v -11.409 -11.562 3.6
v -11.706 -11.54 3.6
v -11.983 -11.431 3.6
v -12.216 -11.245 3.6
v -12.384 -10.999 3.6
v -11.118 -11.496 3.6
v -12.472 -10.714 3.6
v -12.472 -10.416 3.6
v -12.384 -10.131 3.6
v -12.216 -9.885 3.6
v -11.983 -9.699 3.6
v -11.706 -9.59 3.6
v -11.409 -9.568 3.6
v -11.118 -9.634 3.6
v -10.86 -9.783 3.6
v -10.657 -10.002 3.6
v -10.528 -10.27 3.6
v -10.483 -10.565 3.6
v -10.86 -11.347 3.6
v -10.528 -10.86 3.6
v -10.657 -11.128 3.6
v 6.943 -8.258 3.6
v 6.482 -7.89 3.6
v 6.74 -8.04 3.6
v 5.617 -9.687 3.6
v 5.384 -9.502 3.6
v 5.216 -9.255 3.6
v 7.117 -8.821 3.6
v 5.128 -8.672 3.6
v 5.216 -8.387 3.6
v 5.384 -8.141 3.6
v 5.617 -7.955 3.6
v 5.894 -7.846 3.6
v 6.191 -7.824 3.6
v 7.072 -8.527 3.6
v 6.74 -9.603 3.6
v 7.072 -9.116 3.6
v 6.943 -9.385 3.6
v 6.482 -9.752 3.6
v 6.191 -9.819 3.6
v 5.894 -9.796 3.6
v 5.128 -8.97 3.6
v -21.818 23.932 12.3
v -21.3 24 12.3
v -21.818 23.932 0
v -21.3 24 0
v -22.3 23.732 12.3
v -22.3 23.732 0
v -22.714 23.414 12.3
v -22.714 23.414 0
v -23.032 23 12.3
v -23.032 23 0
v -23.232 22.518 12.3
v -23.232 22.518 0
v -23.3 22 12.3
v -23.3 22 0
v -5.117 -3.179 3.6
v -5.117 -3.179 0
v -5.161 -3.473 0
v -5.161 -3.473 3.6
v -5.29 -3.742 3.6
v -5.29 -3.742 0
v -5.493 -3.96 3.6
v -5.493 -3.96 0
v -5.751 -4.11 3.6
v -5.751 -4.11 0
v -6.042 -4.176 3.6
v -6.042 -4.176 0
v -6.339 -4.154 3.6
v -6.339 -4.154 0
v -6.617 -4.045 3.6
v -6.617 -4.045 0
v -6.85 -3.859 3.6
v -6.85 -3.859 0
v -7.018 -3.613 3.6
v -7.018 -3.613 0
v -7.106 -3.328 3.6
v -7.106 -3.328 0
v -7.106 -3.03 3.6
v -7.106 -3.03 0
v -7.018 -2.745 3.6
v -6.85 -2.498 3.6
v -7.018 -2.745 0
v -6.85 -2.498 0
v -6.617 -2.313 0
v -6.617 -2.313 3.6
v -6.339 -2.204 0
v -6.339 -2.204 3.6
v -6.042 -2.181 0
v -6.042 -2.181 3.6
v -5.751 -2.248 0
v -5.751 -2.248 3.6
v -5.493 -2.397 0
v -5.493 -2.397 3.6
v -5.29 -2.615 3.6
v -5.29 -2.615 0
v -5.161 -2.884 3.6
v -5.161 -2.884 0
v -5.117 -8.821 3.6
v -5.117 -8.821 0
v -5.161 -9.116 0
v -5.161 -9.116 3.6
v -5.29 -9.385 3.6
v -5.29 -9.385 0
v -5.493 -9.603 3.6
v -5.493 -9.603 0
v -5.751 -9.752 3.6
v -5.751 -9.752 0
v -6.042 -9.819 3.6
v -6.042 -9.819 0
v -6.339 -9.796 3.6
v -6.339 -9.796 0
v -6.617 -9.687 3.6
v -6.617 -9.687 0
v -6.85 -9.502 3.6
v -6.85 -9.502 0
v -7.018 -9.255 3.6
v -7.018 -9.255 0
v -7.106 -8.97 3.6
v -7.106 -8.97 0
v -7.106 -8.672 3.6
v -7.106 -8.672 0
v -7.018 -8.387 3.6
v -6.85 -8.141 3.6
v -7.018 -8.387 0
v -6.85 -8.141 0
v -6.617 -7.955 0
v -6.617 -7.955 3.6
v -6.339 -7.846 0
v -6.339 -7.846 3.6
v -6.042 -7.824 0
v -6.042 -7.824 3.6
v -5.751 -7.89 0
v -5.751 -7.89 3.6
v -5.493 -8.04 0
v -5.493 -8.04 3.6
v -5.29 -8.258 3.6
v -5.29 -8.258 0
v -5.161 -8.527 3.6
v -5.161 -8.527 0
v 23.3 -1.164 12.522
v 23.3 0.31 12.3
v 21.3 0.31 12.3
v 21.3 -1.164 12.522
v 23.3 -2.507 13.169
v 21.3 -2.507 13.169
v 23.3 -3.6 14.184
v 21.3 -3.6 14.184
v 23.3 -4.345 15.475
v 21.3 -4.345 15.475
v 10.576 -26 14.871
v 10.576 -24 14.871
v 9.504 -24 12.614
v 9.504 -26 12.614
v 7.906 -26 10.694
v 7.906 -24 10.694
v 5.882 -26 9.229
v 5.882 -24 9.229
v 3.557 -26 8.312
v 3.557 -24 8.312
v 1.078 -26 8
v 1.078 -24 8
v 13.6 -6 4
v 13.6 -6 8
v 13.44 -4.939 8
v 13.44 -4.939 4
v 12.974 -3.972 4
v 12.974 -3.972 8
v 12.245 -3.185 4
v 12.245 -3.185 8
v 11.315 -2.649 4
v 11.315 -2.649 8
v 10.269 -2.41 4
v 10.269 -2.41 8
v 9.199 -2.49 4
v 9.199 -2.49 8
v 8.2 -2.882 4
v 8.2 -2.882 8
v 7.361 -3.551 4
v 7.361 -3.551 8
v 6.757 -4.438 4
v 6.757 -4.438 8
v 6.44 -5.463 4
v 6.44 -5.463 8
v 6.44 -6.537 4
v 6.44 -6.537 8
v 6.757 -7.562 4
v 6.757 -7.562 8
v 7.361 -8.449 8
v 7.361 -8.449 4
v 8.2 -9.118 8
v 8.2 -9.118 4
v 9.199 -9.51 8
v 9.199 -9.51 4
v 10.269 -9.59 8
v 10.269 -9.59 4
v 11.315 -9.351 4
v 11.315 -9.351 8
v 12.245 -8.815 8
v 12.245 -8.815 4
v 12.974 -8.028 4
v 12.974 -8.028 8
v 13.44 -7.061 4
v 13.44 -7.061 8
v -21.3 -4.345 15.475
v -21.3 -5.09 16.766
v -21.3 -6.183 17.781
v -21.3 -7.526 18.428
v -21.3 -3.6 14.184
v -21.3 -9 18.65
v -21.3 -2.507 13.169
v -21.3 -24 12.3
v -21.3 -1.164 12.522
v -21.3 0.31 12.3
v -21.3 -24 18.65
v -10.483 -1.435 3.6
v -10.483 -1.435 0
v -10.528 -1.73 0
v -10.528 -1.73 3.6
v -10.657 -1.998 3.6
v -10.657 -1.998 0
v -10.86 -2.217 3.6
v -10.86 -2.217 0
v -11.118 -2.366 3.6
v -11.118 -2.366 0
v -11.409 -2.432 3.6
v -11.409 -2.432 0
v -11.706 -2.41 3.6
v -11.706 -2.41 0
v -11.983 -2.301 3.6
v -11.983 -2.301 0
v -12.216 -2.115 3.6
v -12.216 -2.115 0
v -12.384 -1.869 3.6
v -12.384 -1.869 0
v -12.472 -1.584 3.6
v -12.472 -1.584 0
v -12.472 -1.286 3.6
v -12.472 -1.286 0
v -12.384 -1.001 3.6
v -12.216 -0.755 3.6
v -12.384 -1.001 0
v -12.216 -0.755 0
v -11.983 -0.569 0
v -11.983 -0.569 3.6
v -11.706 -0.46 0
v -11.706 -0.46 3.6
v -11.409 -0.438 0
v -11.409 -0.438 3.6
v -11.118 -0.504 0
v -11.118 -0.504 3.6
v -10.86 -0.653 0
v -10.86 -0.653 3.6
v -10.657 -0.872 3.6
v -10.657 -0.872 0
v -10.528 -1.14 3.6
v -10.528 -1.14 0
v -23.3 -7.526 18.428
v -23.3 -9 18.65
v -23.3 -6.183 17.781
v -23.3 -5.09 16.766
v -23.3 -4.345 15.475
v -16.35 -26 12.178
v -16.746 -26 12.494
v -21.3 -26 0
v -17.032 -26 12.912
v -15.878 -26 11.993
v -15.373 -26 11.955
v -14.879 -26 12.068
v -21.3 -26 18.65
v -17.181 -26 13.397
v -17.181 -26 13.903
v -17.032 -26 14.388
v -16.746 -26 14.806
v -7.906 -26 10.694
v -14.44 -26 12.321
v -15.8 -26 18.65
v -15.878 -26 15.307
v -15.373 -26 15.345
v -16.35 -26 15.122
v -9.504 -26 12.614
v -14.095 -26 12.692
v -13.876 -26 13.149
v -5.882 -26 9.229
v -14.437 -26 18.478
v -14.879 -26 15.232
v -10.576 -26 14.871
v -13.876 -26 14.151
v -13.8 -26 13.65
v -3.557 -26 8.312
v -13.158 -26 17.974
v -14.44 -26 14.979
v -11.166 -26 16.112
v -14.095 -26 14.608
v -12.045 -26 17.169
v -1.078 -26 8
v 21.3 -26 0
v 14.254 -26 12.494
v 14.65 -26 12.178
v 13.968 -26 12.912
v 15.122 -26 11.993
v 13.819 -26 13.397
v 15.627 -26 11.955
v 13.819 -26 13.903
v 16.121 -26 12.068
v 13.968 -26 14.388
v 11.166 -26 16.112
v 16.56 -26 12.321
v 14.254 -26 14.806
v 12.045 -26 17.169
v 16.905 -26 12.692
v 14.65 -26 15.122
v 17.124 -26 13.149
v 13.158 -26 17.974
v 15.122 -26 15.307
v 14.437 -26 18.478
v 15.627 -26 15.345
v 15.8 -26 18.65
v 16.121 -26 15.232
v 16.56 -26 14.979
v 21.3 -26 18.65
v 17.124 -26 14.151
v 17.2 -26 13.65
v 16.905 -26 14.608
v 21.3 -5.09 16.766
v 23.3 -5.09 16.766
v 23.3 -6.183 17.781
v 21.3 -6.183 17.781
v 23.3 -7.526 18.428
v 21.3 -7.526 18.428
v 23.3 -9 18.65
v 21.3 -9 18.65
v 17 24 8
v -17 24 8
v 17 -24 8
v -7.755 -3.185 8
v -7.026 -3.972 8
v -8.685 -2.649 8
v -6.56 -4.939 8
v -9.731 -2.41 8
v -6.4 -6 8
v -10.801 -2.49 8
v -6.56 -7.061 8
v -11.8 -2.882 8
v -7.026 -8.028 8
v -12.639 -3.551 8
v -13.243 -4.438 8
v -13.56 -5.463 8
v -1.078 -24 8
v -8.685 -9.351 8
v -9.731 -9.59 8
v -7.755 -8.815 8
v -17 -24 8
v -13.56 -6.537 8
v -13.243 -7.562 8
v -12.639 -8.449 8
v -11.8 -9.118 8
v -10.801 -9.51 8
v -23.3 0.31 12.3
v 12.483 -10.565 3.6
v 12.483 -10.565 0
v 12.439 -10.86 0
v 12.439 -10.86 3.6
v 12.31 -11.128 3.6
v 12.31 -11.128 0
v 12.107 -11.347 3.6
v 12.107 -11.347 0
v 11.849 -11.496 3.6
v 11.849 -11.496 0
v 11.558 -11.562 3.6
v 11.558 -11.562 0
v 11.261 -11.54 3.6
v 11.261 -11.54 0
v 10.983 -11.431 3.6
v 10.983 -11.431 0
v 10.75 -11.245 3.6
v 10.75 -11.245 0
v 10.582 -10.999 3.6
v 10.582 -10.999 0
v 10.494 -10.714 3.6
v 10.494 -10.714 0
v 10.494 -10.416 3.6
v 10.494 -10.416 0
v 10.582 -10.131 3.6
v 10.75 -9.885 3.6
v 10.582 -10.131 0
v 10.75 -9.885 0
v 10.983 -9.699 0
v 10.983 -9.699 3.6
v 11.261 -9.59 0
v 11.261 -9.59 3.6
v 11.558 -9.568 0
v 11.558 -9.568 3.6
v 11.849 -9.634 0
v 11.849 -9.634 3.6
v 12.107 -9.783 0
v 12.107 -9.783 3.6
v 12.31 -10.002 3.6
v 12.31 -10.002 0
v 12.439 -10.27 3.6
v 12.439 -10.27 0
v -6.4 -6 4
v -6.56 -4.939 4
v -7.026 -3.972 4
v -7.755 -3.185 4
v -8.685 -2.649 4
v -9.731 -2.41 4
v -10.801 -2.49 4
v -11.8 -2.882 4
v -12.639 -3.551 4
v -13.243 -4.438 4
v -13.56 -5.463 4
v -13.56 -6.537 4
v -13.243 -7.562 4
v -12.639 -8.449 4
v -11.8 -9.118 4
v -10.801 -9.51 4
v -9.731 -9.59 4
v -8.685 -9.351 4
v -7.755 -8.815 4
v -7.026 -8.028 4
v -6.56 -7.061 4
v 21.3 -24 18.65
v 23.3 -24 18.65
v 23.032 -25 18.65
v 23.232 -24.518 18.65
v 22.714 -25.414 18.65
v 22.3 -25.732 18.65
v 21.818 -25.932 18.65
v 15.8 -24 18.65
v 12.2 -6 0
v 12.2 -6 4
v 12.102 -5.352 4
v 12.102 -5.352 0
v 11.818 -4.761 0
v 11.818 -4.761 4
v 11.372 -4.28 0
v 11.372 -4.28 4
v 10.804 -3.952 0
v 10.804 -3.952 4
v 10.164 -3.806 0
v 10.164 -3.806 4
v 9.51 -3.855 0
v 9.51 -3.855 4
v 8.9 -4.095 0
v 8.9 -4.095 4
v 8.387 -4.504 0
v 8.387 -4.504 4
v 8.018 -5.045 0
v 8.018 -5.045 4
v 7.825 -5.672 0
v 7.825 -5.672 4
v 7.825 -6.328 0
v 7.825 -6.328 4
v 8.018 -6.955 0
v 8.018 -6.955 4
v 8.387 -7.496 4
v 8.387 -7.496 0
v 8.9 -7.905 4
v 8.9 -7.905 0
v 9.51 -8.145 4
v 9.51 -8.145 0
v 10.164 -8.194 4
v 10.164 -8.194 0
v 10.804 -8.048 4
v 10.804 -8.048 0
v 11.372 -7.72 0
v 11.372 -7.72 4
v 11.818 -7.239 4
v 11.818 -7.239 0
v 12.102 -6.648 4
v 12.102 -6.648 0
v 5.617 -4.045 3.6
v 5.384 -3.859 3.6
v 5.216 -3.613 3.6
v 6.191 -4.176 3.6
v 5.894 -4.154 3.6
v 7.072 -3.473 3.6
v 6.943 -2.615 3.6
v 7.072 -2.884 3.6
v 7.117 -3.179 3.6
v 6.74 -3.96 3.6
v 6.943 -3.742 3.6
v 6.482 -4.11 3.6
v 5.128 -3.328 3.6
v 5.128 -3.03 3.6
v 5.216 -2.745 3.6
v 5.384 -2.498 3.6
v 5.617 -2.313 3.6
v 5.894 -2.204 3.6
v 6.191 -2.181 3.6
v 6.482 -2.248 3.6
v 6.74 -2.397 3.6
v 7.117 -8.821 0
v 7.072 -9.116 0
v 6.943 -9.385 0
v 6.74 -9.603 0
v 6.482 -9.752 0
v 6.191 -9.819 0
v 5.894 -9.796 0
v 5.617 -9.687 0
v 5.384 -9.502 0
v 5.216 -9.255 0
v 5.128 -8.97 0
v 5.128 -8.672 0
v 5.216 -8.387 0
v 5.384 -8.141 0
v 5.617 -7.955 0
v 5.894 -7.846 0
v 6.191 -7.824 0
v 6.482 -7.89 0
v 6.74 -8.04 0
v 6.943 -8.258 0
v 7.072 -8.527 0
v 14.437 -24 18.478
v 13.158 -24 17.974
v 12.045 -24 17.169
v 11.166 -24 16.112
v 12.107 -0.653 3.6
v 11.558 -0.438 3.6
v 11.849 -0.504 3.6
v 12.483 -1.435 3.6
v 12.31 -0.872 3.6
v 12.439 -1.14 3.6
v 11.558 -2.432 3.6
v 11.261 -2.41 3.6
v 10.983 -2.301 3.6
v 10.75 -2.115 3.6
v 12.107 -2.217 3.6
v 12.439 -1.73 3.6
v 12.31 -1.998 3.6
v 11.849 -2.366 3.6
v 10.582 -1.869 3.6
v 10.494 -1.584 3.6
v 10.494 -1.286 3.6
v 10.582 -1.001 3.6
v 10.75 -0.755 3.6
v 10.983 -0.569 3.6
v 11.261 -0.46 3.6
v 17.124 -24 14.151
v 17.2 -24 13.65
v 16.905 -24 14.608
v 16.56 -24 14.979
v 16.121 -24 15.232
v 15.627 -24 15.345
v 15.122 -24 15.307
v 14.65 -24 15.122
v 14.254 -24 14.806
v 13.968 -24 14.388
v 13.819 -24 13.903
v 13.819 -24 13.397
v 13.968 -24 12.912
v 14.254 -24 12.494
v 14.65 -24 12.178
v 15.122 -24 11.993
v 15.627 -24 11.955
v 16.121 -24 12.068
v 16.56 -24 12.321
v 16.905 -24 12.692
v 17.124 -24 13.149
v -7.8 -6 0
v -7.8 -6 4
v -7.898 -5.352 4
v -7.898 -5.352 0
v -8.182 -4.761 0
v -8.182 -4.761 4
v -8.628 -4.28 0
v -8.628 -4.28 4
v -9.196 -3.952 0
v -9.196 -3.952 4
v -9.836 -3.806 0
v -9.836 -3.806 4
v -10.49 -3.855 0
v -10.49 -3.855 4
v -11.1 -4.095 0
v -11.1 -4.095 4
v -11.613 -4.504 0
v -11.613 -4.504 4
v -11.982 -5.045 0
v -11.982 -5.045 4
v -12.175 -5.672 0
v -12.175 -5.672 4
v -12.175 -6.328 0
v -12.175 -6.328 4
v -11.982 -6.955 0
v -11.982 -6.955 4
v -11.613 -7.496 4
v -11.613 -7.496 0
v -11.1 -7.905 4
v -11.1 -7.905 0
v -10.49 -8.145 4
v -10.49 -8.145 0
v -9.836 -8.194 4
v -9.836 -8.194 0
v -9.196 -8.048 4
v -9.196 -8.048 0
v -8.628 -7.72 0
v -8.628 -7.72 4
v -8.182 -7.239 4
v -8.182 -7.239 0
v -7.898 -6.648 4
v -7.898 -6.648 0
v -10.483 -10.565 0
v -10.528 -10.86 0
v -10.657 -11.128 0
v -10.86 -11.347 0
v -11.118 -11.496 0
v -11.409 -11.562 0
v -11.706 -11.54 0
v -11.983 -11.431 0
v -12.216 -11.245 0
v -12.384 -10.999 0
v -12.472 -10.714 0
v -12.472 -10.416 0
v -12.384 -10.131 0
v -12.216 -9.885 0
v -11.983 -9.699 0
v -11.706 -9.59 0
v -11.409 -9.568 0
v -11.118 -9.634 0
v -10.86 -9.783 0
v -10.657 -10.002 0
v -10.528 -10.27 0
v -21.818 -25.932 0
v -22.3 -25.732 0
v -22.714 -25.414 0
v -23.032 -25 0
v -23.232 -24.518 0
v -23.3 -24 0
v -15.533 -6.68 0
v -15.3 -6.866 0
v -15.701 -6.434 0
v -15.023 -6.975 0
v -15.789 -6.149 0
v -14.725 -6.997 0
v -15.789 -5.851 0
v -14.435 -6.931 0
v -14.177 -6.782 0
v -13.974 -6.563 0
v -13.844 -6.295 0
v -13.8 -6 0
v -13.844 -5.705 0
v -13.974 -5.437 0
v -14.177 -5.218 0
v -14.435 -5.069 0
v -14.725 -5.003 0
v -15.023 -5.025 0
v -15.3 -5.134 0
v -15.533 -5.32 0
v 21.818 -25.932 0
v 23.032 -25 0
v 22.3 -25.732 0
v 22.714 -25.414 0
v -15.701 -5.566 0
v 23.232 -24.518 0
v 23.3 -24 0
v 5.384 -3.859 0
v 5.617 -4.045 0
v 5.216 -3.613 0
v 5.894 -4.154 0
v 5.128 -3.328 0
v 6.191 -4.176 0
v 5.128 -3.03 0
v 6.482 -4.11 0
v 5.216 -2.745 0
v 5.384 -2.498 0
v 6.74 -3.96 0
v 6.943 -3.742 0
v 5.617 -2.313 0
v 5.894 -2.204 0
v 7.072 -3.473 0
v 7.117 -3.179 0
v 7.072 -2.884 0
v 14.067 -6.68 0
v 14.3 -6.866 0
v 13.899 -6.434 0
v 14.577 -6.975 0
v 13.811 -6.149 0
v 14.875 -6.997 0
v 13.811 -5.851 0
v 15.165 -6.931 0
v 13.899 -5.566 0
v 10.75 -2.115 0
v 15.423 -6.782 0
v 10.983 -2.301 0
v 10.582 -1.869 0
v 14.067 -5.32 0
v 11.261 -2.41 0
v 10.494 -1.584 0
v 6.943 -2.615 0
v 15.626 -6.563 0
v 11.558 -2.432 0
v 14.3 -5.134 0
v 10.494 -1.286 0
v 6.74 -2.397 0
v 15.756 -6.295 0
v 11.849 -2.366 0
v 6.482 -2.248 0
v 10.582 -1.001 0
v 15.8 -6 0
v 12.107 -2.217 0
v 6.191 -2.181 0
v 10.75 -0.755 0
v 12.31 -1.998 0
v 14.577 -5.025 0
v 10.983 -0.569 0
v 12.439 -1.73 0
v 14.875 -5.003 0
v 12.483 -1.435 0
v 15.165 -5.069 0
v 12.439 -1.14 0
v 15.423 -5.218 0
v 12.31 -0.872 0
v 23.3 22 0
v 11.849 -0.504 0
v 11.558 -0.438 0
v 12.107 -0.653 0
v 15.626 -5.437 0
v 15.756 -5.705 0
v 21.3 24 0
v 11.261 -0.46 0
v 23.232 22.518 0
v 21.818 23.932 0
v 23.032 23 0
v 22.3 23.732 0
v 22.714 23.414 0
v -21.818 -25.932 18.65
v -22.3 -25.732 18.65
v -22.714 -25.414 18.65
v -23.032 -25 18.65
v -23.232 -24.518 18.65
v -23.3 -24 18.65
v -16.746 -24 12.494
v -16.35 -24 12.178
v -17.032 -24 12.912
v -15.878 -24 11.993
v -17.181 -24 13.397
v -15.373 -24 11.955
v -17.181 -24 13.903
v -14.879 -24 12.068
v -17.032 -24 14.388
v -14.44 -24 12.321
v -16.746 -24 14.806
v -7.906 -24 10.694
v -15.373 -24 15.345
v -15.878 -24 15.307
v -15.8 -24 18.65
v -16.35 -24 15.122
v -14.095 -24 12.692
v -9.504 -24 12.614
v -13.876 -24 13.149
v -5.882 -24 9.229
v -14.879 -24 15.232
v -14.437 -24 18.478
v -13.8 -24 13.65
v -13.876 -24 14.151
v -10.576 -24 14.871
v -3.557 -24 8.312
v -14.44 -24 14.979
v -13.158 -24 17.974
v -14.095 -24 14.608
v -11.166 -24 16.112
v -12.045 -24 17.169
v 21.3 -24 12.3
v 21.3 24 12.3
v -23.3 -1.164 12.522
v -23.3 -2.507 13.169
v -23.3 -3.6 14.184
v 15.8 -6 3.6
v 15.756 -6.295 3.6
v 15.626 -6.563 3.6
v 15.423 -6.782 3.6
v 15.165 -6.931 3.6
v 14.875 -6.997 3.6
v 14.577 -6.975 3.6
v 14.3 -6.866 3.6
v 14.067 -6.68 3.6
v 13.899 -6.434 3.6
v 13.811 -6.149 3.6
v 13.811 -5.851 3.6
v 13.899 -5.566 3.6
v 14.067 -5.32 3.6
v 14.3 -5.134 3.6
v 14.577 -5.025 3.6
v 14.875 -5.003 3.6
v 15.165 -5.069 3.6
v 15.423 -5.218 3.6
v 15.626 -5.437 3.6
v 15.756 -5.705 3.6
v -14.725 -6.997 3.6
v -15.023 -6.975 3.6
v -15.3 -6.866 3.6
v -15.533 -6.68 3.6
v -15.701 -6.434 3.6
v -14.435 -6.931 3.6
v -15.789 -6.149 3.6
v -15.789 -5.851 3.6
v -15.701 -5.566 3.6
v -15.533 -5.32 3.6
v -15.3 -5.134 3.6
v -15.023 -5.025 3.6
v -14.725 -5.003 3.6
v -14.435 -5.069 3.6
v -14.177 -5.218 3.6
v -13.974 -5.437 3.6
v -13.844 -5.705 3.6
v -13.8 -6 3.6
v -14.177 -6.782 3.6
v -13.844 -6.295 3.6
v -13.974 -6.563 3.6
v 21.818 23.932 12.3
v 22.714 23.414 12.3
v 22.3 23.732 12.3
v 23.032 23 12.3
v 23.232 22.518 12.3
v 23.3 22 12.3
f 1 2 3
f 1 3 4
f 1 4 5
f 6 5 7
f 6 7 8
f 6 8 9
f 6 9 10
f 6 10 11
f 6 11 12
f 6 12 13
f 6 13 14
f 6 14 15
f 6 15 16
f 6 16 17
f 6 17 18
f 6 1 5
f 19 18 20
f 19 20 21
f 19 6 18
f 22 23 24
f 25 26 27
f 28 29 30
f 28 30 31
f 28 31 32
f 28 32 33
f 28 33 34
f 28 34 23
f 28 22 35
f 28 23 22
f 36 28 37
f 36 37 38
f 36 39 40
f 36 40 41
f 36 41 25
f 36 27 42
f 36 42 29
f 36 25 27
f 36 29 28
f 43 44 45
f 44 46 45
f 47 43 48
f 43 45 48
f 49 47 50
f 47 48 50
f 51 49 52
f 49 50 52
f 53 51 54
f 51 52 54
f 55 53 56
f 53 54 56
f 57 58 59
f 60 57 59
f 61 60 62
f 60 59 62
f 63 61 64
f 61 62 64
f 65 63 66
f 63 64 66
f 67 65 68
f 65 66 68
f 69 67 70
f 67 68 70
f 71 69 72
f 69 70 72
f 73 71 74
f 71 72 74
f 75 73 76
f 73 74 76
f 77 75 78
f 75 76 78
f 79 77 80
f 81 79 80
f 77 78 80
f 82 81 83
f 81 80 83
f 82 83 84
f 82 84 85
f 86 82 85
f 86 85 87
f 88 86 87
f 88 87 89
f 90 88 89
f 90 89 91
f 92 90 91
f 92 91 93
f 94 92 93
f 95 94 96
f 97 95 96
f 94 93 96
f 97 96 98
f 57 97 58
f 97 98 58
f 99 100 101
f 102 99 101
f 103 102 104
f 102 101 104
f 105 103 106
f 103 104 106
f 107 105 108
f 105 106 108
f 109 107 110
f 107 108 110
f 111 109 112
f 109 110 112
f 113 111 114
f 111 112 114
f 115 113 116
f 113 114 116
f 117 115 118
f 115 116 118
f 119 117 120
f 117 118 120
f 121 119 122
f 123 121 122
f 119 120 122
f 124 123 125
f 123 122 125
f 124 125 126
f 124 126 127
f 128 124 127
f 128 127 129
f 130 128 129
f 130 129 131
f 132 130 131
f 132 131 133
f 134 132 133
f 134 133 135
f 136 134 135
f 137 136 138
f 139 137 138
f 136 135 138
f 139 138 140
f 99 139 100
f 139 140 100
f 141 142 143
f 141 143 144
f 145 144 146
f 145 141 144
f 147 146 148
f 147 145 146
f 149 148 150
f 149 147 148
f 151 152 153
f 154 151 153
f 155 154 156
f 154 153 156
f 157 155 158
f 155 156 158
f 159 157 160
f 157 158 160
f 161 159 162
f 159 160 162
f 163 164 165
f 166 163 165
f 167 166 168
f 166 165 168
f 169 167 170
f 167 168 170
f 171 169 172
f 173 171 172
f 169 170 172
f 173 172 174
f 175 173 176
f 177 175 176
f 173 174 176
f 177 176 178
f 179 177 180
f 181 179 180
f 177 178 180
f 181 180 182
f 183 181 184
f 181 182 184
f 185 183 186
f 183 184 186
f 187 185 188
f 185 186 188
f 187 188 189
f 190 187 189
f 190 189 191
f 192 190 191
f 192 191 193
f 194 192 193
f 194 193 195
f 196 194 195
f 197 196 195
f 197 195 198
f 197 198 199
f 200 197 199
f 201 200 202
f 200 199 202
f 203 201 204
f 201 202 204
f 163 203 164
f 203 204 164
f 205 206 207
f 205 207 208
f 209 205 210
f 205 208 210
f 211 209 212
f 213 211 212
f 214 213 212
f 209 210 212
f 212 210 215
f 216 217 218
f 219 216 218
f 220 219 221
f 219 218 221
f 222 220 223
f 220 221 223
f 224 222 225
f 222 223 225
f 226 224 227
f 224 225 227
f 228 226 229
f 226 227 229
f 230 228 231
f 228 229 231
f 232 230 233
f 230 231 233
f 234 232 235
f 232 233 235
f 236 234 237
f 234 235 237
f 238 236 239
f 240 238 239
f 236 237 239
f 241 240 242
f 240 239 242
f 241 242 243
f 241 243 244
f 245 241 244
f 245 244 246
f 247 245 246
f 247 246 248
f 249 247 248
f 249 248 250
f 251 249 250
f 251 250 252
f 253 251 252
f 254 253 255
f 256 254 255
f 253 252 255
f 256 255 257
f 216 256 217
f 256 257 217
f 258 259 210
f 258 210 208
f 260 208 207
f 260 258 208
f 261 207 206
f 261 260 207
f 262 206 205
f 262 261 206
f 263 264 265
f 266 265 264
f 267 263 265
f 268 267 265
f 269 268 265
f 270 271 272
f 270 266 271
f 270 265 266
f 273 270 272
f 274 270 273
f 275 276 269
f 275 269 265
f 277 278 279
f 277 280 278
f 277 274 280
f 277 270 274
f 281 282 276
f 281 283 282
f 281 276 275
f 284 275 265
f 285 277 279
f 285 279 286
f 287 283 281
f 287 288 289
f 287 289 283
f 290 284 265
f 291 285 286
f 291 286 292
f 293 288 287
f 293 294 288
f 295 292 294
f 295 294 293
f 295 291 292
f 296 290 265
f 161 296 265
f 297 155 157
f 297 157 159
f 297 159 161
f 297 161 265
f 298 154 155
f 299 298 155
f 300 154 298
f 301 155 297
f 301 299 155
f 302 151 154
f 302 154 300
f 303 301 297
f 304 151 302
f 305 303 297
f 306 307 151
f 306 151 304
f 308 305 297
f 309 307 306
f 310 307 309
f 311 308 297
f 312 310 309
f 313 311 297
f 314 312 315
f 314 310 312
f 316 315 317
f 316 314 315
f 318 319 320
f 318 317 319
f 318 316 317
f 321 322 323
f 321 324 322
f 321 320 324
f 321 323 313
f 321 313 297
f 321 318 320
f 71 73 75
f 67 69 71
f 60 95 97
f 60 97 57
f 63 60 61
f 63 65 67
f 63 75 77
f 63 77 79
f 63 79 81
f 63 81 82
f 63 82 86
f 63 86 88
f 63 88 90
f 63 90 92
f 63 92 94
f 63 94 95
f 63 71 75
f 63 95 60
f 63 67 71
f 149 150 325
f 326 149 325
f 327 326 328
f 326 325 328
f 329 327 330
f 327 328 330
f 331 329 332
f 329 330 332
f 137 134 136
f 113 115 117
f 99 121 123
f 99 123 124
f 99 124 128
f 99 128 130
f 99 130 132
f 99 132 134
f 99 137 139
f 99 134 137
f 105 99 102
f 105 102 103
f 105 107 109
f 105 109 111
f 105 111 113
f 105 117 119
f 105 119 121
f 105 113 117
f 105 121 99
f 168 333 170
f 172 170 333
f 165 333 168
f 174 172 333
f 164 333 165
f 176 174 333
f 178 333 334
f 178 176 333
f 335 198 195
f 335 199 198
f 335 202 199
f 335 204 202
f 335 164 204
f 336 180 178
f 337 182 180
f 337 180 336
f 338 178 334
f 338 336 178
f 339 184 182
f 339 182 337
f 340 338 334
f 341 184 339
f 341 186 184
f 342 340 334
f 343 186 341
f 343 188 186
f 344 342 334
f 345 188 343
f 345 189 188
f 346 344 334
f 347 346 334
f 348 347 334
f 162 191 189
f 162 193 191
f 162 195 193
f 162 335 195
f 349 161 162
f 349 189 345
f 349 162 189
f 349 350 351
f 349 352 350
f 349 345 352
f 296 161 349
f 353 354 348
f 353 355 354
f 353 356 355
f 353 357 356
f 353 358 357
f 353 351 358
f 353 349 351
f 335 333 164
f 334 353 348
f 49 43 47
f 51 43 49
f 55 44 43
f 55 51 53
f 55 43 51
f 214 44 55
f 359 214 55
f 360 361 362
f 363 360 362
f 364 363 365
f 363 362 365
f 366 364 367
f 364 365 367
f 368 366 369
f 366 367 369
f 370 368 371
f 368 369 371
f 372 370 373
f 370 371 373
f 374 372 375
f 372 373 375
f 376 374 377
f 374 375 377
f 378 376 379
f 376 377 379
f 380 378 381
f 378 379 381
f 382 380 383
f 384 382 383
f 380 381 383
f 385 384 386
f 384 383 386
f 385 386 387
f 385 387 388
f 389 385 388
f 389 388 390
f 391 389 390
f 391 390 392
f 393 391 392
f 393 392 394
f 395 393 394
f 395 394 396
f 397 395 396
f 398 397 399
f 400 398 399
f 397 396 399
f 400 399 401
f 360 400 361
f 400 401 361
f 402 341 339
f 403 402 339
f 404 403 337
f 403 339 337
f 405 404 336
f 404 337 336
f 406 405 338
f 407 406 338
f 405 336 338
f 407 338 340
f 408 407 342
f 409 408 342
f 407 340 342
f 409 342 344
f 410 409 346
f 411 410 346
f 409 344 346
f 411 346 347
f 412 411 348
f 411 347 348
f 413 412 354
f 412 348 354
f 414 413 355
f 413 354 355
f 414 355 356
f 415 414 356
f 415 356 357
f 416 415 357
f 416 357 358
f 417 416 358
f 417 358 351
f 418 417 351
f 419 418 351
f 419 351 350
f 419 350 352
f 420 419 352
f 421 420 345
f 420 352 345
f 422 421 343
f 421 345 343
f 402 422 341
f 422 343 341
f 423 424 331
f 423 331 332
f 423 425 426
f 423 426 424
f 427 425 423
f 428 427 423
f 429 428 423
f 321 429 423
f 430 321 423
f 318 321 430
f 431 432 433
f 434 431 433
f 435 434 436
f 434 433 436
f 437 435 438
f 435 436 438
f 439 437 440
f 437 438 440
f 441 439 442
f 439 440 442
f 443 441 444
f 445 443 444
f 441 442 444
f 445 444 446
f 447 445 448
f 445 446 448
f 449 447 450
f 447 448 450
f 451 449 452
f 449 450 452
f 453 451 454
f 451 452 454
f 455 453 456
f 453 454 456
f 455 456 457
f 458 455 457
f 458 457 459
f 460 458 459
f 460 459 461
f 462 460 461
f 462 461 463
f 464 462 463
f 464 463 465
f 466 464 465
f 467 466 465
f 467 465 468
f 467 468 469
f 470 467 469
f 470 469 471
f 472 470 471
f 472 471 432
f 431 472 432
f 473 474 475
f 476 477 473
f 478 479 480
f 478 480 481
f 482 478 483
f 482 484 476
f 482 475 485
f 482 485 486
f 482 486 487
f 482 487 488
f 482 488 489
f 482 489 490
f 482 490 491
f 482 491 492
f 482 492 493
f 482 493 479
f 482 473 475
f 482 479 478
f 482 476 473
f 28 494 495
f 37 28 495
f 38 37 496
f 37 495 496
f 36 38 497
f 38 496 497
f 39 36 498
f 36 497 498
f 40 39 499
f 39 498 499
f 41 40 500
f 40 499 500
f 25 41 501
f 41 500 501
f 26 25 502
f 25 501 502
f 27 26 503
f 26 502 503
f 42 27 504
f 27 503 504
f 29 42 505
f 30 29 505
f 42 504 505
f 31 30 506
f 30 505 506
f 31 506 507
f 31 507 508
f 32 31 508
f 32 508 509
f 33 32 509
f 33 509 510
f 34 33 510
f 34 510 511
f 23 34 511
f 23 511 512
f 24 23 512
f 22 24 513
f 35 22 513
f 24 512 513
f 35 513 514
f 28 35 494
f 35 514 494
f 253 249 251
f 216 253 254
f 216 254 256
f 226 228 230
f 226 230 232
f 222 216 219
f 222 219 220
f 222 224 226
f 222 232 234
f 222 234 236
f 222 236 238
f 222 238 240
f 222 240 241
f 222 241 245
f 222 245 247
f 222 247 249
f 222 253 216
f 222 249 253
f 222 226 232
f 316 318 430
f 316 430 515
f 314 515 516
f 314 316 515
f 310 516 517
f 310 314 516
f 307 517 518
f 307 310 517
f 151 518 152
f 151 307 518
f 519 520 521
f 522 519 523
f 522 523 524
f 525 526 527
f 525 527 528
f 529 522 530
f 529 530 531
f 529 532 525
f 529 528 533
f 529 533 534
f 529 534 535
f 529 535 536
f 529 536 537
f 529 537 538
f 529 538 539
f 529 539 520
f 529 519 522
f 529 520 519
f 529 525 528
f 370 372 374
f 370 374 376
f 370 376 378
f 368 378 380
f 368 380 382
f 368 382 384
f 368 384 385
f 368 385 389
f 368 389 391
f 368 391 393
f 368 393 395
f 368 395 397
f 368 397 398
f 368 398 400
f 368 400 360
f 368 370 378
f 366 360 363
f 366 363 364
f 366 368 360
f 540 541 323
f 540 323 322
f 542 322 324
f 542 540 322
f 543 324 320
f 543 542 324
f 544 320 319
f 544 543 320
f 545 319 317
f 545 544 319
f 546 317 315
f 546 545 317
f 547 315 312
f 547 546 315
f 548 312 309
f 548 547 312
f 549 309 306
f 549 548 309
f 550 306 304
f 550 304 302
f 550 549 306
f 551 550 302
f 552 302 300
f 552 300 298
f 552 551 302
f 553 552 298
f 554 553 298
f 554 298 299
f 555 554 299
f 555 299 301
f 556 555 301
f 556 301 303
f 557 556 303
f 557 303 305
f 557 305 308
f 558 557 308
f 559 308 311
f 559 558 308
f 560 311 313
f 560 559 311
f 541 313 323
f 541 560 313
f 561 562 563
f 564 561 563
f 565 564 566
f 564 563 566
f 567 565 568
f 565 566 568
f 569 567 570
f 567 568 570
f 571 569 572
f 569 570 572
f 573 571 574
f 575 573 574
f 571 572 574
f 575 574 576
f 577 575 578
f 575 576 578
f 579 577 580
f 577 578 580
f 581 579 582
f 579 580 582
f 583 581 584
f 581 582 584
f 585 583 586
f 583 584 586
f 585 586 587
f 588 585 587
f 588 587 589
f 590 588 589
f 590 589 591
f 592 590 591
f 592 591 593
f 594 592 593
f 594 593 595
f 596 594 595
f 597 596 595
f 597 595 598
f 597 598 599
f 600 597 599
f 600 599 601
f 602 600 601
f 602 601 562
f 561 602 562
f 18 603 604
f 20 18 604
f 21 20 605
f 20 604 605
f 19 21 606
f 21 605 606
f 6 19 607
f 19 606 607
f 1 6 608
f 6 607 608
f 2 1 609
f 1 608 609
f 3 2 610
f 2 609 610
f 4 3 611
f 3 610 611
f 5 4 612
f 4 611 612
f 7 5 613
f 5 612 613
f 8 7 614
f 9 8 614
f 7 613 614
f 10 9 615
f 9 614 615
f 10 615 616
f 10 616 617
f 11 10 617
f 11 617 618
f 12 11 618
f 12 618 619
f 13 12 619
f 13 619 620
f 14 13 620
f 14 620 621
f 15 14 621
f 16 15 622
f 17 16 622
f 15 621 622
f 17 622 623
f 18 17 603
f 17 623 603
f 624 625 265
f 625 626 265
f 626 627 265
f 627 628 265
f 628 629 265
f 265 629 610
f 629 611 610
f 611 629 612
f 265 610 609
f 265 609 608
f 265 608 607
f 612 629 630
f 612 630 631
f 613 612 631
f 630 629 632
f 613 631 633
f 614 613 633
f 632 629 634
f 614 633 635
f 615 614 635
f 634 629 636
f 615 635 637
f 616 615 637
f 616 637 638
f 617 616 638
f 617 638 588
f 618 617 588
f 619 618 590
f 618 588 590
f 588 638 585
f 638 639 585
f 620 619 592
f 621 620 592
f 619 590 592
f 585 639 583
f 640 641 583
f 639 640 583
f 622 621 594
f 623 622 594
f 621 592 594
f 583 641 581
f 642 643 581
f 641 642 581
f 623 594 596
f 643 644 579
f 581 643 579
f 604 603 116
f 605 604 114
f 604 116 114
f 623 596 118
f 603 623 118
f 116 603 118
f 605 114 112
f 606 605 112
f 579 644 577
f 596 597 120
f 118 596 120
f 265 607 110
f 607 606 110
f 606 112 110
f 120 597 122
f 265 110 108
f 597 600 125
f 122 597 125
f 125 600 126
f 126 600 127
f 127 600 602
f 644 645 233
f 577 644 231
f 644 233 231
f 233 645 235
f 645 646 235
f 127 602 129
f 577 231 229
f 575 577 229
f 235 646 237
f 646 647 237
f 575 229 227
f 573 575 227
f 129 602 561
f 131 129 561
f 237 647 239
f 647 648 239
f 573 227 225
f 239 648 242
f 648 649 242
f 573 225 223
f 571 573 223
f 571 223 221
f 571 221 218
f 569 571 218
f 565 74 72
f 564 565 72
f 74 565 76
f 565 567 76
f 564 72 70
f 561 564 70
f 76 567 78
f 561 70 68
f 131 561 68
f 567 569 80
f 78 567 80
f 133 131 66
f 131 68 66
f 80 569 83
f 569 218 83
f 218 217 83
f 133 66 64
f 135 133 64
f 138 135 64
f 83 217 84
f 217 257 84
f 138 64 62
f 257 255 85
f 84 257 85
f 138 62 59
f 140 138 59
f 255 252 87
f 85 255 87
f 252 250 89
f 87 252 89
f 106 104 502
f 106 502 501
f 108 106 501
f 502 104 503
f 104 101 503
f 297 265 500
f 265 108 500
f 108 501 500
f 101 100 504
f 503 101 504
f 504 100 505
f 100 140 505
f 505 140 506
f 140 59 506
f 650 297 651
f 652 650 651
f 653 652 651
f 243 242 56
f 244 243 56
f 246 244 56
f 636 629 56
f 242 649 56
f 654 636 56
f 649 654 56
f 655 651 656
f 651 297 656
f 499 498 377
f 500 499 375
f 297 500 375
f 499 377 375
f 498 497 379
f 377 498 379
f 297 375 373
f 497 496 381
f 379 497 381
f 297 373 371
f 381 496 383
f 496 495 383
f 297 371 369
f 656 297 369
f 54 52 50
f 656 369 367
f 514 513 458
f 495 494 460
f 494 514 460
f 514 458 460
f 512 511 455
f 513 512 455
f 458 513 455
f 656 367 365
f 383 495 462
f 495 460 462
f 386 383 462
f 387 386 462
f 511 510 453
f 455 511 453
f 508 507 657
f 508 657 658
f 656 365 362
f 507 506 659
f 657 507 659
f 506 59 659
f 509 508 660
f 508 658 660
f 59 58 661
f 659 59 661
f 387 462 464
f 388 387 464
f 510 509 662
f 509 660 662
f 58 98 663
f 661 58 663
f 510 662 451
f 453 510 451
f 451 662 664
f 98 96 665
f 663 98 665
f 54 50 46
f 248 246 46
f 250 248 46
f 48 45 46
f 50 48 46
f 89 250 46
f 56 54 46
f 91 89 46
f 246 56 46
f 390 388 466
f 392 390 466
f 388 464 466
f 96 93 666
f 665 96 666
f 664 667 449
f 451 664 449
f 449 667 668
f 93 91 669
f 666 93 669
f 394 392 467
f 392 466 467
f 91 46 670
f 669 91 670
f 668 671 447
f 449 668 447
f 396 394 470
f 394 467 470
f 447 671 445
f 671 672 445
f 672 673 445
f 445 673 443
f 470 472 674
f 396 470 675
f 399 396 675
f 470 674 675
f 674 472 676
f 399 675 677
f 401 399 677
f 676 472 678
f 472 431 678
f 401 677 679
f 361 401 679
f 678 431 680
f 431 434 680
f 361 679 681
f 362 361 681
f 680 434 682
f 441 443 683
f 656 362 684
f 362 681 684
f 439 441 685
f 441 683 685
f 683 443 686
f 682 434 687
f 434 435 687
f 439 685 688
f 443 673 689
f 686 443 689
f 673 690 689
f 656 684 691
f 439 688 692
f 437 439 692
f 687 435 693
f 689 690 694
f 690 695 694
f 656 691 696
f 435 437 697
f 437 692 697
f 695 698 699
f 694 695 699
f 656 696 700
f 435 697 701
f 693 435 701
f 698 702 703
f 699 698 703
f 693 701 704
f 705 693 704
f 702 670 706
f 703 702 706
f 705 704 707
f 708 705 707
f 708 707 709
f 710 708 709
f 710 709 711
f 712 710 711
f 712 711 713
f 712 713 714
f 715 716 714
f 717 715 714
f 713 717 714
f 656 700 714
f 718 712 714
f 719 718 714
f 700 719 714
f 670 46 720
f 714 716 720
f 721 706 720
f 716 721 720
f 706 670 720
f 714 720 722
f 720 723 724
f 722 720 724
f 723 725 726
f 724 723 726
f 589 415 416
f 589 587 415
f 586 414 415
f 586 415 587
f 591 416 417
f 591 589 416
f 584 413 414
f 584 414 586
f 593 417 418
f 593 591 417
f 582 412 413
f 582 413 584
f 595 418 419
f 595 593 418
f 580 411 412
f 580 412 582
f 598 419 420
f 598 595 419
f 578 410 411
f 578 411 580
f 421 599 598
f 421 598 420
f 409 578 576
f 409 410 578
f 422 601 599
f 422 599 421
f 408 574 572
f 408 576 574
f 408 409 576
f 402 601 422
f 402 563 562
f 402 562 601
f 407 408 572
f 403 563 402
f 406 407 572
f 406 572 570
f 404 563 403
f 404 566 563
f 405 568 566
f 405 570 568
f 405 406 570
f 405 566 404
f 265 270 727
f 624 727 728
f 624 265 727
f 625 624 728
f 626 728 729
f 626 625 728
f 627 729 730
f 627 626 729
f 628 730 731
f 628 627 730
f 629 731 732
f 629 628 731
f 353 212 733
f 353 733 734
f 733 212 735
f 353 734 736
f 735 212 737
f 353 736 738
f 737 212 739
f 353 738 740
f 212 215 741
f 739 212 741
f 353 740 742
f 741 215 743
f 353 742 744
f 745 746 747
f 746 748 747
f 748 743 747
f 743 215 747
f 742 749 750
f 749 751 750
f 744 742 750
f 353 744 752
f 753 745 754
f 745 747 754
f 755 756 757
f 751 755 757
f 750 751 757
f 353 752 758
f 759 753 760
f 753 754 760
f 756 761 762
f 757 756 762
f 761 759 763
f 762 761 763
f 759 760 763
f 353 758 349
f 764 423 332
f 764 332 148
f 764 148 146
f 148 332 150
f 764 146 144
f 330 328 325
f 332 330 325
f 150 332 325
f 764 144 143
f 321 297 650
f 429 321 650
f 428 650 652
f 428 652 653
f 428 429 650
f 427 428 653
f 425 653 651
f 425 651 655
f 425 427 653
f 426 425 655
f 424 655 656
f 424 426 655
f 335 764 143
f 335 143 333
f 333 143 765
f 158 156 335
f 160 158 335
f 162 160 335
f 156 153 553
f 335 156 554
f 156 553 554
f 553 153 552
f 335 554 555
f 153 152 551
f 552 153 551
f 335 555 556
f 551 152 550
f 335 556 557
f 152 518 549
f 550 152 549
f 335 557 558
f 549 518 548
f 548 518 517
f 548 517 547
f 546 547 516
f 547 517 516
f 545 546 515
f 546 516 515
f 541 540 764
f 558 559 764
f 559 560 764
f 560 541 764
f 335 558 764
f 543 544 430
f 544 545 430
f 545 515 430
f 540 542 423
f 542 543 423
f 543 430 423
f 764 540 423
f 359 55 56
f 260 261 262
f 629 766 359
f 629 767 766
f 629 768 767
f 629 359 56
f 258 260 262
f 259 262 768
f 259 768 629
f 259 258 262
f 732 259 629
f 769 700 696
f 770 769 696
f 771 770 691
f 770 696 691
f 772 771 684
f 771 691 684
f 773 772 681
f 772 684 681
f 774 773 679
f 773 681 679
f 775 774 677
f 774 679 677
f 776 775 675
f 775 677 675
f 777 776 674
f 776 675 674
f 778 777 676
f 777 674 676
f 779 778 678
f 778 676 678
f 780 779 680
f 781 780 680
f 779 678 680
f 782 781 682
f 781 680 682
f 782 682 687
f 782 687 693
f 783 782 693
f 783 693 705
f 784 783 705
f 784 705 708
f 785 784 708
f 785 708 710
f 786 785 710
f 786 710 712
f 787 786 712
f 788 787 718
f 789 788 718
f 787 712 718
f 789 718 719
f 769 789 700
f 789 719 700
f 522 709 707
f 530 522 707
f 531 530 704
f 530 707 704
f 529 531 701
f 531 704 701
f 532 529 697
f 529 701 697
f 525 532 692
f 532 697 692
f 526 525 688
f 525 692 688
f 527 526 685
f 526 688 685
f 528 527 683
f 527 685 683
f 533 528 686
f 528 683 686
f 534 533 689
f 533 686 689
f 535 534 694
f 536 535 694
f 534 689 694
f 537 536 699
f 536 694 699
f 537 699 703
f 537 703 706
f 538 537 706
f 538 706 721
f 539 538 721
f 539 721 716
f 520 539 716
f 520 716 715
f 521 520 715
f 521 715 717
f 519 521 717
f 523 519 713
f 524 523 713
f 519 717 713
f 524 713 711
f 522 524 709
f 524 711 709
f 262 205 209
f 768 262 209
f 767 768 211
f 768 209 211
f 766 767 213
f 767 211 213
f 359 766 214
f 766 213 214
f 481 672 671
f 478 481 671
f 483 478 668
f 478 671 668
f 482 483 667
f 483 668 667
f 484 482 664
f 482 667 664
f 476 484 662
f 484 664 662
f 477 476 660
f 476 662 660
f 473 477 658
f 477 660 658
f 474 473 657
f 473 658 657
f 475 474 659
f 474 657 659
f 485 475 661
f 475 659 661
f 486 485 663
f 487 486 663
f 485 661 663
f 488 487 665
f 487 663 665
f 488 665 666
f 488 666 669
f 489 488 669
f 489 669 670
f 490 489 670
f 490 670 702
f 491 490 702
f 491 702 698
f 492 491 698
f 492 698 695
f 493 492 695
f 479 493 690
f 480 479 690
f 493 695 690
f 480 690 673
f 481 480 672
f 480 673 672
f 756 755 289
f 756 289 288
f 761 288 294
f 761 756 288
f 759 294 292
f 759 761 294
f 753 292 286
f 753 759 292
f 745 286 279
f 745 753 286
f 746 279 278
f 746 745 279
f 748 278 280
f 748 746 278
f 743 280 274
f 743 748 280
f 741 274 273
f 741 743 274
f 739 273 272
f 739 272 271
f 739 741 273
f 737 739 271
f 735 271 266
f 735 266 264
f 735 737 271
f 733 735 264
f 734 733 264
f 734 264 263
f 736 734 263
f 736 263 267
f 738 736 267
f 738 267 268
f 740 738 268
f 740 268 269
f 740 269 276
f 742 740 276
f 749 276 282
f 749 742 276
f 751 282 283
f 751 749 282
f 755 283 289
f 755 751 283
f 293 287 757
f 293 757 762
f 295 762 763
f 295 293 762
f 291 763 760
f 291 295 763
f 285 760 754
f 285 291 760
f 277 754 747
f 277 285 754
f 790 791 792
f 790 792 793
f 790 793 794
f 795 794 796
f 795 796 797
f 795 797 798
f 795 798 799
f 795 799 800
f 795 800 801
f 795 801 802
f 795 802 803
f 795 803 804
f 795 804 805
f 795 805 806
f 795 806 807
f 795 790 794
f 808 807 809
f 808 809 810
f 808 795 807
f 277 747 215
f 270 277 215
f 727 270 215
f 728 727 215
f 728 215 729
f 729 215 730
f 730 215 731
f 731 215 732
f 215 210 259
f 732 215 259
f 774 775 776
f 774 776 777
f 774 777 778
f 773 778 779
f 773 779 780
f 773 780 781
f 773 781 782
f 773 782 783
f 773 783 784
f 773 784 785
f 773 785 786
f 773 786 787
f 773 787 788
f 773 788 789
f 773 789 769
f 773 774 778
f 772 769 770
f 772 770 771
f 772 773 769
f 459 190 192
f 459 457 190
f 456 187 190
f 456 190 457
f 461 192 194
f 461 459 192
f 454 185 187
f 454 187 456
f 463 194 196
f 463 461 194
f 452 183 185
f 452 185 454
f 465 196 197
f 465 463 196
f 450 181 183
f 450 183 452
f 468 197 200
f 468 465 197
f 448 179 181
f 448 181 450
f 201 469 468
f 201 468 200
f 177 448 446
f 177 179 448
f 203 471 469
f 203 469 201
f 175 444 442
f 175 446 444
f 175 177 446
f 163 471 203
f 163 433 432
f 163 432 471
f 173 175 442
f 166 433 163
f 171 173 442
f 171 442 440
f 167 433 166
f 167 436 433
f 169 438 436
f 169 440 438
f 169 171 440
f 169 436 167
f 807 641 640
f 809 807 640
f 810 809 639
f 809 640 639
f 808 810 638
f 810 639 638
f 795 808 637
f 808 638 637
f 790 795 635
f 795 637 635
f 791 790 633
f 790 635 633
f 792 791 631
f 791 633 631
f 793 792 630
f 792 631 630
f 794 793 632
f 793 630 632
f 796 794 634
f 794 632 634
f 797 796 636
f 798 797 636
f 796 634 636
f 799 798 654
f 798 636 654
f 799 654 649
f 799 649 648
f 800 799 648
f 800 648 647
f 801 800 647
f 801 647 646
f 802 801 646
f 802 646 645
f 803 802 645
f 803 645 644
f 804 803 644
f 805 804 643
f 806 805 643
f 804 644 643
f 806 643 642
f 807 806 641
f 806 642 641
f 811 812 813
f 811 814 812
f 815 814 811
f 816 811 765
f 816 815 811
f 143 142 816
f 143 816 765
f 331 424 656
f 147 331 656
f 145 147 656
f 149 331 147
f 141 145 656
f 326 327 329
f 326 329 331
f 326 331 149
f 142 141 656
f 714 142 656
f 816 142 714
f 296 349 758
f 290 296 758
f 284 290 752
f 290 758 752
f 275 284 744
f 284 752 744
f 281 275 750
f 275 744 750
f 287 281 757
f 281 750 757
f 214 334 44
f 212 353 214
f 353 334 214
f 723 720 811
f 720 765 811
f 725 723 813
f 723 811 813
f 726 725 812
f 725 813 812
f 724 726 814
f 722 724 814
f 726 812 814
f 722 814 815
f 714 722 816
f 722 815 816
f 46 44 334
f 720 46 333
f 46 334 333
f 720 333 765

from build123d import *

# Parameters (mm, degrees)
F1_DEPTH     = 24
F2_R         = 1.7
F3_DEPTH     = 2
F4_R         = 5.5
F5_T1_DEPTH  = 2
F6_W         = 2
F6_H         = 6.35
F7_DEPTH     = 20
F8_R         = 5
F9_T4_DEPTH  = 2
F9_T9_DEPTH  = 12.7751879692
F9_T15_DEPTH = 2
F9_T20_DEPTH = 2
F9_T25_DEPTH = 2
F9_T30_DEPTH = 12.7751879692
F10_R        = 2.2
F11_DEPTH    = 8
F10_R_2      = 3.6
F12_DEPTH    = 4
F13_R        = 1
F14_DEPTH    = 3.6
F15_R        = 2


# Not quite as in the source:
# - a fillet or chamfer that OpenCascade refuses, or shapes differently, is made with other operations: its cross-section is extruded or revolved along the edge and cut away or added


with BuildPart() as f1:
    # F0 (on Front) → F1 (new body, symmetric)
    with BuildSketch(Plane.XZ):
        Polygon((-23.3, 12.3), (-23.3, 0), (0, 0), (23.3, 0), (23.3, 12.3), (21.3, 12.3), (17, 8), (0, 8), (-17, 8), (-21.3, 12.3), align=None)
    extrude(amount=F1_DEPTH, both=True)

    # F2 (on face) → F3 (join)
    with BuildSketch(Plane.XZ.offset(24)):
        Polygon((-23.3, 18.65), (-23.3, 12.3), (-21.3, 12.3), (-17, 8), (-10.3, 8), (-10.3, 18.65), align=None)
        with Locations((-15.5, 13.65)):
            Circle(F2_R, mode=Mode.SUBTRACT)
        Polygon((21.3, 12.3), (23.3, 12.3), (23.3, 18.65), (10.3, 18.65), (10.3, 8), (17, 8), align=None)
        with Locations((15.5, 13.65)):
            Circle(F2_R, mode=Mode.SUBTRACT)
        Polygon((-21.3, 12.3), (-23.3, 12.3), (-23.3, 0), (23.3, 0), (23.3, 12.3), (21.3, 12.3), (17, 8), (10.3, 8), (-10.3, 8), (-17, 8), align=None)
    extrude(amount=F3_DEPTH)

    # F4
    f4_edges = [f1.edges().sort_by_distance(p)[0] for p in [
        (-10.3, -25, 18.65),
        (10.3, -25, 18.65),
    ]]
    fillet(f4_edges, radius=F4_R)

    # F5: fillet of radius 10 on 2 edges, made by hand

    # F5_s2 → F5_t1 (join)
    with BuildSketch(Plane.XZ.offset(24)):
        with BuildLine():
            ThreePointArc((-1.0783322956, 8), (-6.9396323825, 9.8978298407), (-10.5761824275, 14.8709677419))
            Line((-10.5761824275, 14.8709677419), (-11.5259674406, 14.5580645161))
            ThreePointArc((-11.5259674406, 14.5580645161), (-11.3, 13.15), (-11.3, 8))
            Line((-11.3, 8), (-10.3, 7))
            Line((-10.3, 7), (-1.0783322956, 7))
            Line((-1.0783322956, 7), (-1.0783322956, 8))
        make_face()
        with BuildLine():
            ThreePointArc((10.5761824275, 14.8709677419), (6.9396323825, 9.8978298407), (1.0783322956, 8))
            Line((1.0783322956, 8), (1.0783322956, 7))
            Line((1.0783322956, 7), (10.3, 7))
            Line((10.3, 7), (11.3, 8))
            ThreePointArc((11.3, 8), (11.3, 13.15), (11.5259674406, 14.5580645161))
            Line((11.5259674406, 14.5580645161), (10.5761824275, 14.8709677419))
        make_face()
    extrude(amount=F5_T1_DEPTH)

    # F6 (on face) → F7 (join)
    with BuildSketch(Plane(origin=(0, -24, 0), x_dir=(-1, 0, 0), z_dir=(0, 1, 0))):
        with Locations((-22.3, 15.475)):
            Rectangle(F6_W, F6_H)
        with Locations((22.3, 15.475)):
            Rectangle(F6_W, F6_H)
    extrude(amount=F7_DEPTH)

    # F8
    f8_edges = [f1.edges().sort_by_distance(p)[0] for p in [
        (22.3, -4, 18.65),
        (-22.3, -4, 18.65),
    ]]
    fillet(f8_edges, radius=F8_R)

    # F9: fillet of radius 5 on 2 edges, made by hand


with BuildPart() as f9_tool2:
    # F9_s3 → F9_t4 (new body)
    with BuildSketch(Plane.YZ.offset(-21.3)):
        with BuildLine():
            ThreePointArc((-4.3449624062, 15.475), (-2.5072817297, 13.1693220895), (0.3100751877, 12.3))
            Line((0.3100751877, 12.3), (0.3100751877, 11.8))
            Line((0.3100751877, 11.8), (-4, 11.8))
            Line((-4, 11.8), (-4.5, 12.3))
            ThreePointArc((-4.5, 12.3), (-4.5, 13.65), (-4.8104661656, 15.2925))
            Line((-4.8104661656, 15.2925), (-4.3449624062, 15.475))
        make_face()
    extrude(amount=-F9_T4_DEPTH)

    split(bisect_by=Plane(origin=(-4.5, 0, -4.5), x_dir=(0, 1, 0), z_dir=(0.7071067812, 0, 0.7071067812)), keep=Keep.TOP)


with BuildPart() as f1_1:
    add(f1.part)

    # F9_t1: union F9_tool2
    add(f9_tool2.part)


with BuildPart() as f9_tool7:
    # F9_s8 → F9_t9 (new body)
    with BuildSketch(Plane.YZ.offset(-10.5248120308)):
        with BuildLine():
            ThreePointArc((-4.3449624062, 15.475), (-2.5072817297, 13.1693220895), (0.3100751877, 12.3))
            Line((0.3100751877, 12.3), (0.3100751877, 11.8))
            Line((0.3100751877, 11.8), (-4, 11.8))
            Line((-4, 11.8), (-4.5, 12.3))
            ThreePointArc((-4.5, 12.3), (-4.5, 13.65), (-4.8104661656, 15.2925))
            Line((-4.8104661656, 15.2925), (-4.3449624062, 15.475))
        make_face()
    extrude(amount=-F9_T9_DEPTH)

    split(bisect_by=Plane.YZ.offset(-21.3), keep=Keep.TOP)

    split(bisect_by=Plane(origin=(-4.5, 0, -4.5), x_dir=(0, 1, 0), z_dir=(-0.7071067812, 0, -0.7071067812)), keep=Keep.TOP)


with BuildPart() as f1_2:
    add(f1_1.part)

    # F9_t6: union F9_tool7
    add(f9_tool7.part)


with BuildPart() as f9_tool13:
    # F9_s14 → F9_t15 (new body)
    with BuildSketch(Plane.YZ.offset(-21.3)):
        with BuildLine():
            ThreePointArc((-4.3449624062, 15.475), (-2.5072817297, 13.1693220895), (0.3100751877, 12.3))
            Line((0.3100751877, 12.3), (0.3100751877, 11.8))
            Line((0.3100751877, 11.8), (-4, 11.8))
            Line((-4, 11.8), (-4.5, 12.3))
            ThreePointArc((-4.5, 12.3), (-4.5, 13.65), (-4.8104661656, 15.2925))
            Line((-4.8104661656, 15.2925), (-4.3449624062, 15.475))
        make_face()
    extrude(amount=-F9_T15_DEPTH)

    split(bisect_by=Plane(origin=(-4.5, 0, -4.5), x_dir=(0, 1, 0), z_dir=(-0.7071067812, 0, -0.7071067812)), keep=Keep.TOP)


with BuildPart() as f1_3:
    add(f1_2.part)

    # F9_t12: union F9_tool13
    add(f9_tool13.part)


with BuildPart() as f9_tool18:
    # F9_s19 → F9_t20 (new body)
    with BuildSketch(Plane.YZ.offset(23.3)):
        with BuildLine():
            ThreePointArc((0.3100751877, 12.3), (-2.5072817297, 13.1693220895), (-4.3449624062, 15.475))
            Line((-4.3449624062, 15.475), (-4.8104661656, 15.2925))
            ThreePointArc((-4.8104661656, 15.2925), (-4.5, 13.65), (-4.5, 12.3))
            Line((-4.5, 12.3), (-4, 11.8))
            Line((-4, 11.8), (0.3100751877, 11.8))
            Line((0.3100751877, 11.8), (0.3100751877, 12.3))
        make_face()
    extrude(amount=-F9_T20_DEPTH)

    split(bisect_by=Plane(origin=(4.5, 0, -4.5), x_dir=(0, 1, 0), z_dir=(0.7071067812, 0, -0.7071067812)), keep=Keep.TOP)


with BuildPart() as f1_4:
    add(f1_3.part)

    # F9_t17: union F9_tool18
    add(f9_tool18.part)


with BuildPart() as f9_tool23:
    # F9_s24 → F9_t25 (new body)
    with BuildSketch(Plane.YZ.offset(23.3)):
        with BuildLine():
            ThreePointArc((0.3100751877, 12.3), (-2.5072817297, 13.1693220895), (-4.3449624062, 15.475))
            Line((-4.3449624062, 15.475), (-4.8104661656, 15.2925))
            ThreePointArc((-4.8104661656, 15.2925), (-4.5, 13.65), (-4.5, 12.3))
            Line((-4.5, 12.3), (-4, 11.8))
            Line((-4, 11.8), (0.3100751877, 11.8))
            Line((0.3100751877, 11.8), (0.3100751877, 12.3))
        make_face()
    extrude(amount=-F9_T25_DEPTH)

    split(bisect_by=Plane(origin=(4.5, 0, -4.5), x_dir=(0, 1, 0), z_dir=(-0.7071067812, 0, 0.7071067812)), keep=Keep.TOP)


with BuildPart() as f1_5:
    add(f1_4.part)

    # F9_t22: union F9_tool23
    add(f9_tool23.part)


with BuildPart() as f9_tool28:
    # F9_s29 → F9_t30 (new body)
    with BuildSketch(Plane.YZ.offset(23.3)):
        with BuildLine():
            ThreePointArc((0.3100751877, 12.3), (-2.5072817297, 13.1693220895), (-4.3449624062, 15.475))
            Line((-4.3449624062, 15.475), (-4.8104661656, 15.2925))
            ThreePointArc((-4.8104661656, 15.2925), (-4.5, 13.65), (-4.5, 12.3))
            Line((-4.5, 12.3), (-4, 11.8))
            Line((-4, 11.8), (0.3100751877, 11.8))
            Line((0.3100751877, 11.8), (0.3100751877, 12.3))
        make_face()
    extrude(amount=-F9_T30_DEPTH)

    split(bisect_by=Plane(origin=(4.5, 0, -4.5), x_dir=(0, 1, 0), z_dir=(0.7071067812, 0, -0.7071067812)), keep=Keep.TOP)

    split(bisect_by=Plane.YZ.offset(21.3), keep=Keep.BOTTOM)


with BuildPart() as f1_6:
    add(f1_5.part)

    # F9_t27: union F9_tool28
    add(f9_tool28.part)

    # F10 (on face) → F11 (cut)
    with BuildSketch(Plane.XY.offset(8)):
        with Locations((10, -6)):
            Circle(F10_R)
        with Locations((-10, -6)):
            Circle(F10_R)
    extrude(amount=-F11_DEPTH, mode=Mode.SUBTRACT)

    # F10 (on face) → F12 (cut)
    with BuildSketch(Plane.XY.offset(8)):
        with Locations((10, -6)):
            Circle(F10_R_2)
        with Locations((10, -6)):
            Circle(F10_R, mode=Mode.SUBTRACT)
        with Locations((-10, -6)):
            Circle(F10_R_2)
        with Locations((-10, -6)):
            Circle(F10_R, mode=Mode.SUBTRACT)
    extrude(amount=-F12_DEPTH, mode=Mode.SUBTRACT)

    # F13 (on face) → F14 (cut)
    with BuildSketch(Plane(origin=(0, 0, 0), x_dir=(1, 0, 0), z_dir=(0, 0, -1))):
        with Locations((6.116718427, 3.178630789)):
            Circle(F13_R)
        with Locations((6.116718427, 8.821369211)):
            Circle(F13_R)
        with Locations((11.483281573, 10.5650712782)):
            Circle(F13_R)
        with Locations((11.483281573, 1.4349287218)):
            Circle(F13_R)
        with Locations((14.8, 6)):
            Circle(F13_R)
        with Locations((-11.483281573, 10.5650712782)):
            Circle(F13_R)
        with Locations((-14.8, 6)):
            Circle(F13_R)
        with Locations((-11.483281573, 1.4349287218)):
            Circle(F13_R)
        with Locations((-6.116718427, 3.178630789)):
            Circle(F13_R)
        with Locations((-6.116718427, 8.821369211)):
            Circle(F13_R)
    extrude(amount=-F14_DEPTH, mode=Mode.SUBTRACT)

    # F15
    f15_edges = [f1_6.edges().sort_by_distance(p)[0] for p in [
        (-23.3, 24, 6.15),
        (23.3, 24, 6.15),
        (-23.3, -26, 9.325),
        (23.3, -26, 9.325),
    ]]
    fillet(f15_edges, radius=F15_R)


solid = f1_6.part
